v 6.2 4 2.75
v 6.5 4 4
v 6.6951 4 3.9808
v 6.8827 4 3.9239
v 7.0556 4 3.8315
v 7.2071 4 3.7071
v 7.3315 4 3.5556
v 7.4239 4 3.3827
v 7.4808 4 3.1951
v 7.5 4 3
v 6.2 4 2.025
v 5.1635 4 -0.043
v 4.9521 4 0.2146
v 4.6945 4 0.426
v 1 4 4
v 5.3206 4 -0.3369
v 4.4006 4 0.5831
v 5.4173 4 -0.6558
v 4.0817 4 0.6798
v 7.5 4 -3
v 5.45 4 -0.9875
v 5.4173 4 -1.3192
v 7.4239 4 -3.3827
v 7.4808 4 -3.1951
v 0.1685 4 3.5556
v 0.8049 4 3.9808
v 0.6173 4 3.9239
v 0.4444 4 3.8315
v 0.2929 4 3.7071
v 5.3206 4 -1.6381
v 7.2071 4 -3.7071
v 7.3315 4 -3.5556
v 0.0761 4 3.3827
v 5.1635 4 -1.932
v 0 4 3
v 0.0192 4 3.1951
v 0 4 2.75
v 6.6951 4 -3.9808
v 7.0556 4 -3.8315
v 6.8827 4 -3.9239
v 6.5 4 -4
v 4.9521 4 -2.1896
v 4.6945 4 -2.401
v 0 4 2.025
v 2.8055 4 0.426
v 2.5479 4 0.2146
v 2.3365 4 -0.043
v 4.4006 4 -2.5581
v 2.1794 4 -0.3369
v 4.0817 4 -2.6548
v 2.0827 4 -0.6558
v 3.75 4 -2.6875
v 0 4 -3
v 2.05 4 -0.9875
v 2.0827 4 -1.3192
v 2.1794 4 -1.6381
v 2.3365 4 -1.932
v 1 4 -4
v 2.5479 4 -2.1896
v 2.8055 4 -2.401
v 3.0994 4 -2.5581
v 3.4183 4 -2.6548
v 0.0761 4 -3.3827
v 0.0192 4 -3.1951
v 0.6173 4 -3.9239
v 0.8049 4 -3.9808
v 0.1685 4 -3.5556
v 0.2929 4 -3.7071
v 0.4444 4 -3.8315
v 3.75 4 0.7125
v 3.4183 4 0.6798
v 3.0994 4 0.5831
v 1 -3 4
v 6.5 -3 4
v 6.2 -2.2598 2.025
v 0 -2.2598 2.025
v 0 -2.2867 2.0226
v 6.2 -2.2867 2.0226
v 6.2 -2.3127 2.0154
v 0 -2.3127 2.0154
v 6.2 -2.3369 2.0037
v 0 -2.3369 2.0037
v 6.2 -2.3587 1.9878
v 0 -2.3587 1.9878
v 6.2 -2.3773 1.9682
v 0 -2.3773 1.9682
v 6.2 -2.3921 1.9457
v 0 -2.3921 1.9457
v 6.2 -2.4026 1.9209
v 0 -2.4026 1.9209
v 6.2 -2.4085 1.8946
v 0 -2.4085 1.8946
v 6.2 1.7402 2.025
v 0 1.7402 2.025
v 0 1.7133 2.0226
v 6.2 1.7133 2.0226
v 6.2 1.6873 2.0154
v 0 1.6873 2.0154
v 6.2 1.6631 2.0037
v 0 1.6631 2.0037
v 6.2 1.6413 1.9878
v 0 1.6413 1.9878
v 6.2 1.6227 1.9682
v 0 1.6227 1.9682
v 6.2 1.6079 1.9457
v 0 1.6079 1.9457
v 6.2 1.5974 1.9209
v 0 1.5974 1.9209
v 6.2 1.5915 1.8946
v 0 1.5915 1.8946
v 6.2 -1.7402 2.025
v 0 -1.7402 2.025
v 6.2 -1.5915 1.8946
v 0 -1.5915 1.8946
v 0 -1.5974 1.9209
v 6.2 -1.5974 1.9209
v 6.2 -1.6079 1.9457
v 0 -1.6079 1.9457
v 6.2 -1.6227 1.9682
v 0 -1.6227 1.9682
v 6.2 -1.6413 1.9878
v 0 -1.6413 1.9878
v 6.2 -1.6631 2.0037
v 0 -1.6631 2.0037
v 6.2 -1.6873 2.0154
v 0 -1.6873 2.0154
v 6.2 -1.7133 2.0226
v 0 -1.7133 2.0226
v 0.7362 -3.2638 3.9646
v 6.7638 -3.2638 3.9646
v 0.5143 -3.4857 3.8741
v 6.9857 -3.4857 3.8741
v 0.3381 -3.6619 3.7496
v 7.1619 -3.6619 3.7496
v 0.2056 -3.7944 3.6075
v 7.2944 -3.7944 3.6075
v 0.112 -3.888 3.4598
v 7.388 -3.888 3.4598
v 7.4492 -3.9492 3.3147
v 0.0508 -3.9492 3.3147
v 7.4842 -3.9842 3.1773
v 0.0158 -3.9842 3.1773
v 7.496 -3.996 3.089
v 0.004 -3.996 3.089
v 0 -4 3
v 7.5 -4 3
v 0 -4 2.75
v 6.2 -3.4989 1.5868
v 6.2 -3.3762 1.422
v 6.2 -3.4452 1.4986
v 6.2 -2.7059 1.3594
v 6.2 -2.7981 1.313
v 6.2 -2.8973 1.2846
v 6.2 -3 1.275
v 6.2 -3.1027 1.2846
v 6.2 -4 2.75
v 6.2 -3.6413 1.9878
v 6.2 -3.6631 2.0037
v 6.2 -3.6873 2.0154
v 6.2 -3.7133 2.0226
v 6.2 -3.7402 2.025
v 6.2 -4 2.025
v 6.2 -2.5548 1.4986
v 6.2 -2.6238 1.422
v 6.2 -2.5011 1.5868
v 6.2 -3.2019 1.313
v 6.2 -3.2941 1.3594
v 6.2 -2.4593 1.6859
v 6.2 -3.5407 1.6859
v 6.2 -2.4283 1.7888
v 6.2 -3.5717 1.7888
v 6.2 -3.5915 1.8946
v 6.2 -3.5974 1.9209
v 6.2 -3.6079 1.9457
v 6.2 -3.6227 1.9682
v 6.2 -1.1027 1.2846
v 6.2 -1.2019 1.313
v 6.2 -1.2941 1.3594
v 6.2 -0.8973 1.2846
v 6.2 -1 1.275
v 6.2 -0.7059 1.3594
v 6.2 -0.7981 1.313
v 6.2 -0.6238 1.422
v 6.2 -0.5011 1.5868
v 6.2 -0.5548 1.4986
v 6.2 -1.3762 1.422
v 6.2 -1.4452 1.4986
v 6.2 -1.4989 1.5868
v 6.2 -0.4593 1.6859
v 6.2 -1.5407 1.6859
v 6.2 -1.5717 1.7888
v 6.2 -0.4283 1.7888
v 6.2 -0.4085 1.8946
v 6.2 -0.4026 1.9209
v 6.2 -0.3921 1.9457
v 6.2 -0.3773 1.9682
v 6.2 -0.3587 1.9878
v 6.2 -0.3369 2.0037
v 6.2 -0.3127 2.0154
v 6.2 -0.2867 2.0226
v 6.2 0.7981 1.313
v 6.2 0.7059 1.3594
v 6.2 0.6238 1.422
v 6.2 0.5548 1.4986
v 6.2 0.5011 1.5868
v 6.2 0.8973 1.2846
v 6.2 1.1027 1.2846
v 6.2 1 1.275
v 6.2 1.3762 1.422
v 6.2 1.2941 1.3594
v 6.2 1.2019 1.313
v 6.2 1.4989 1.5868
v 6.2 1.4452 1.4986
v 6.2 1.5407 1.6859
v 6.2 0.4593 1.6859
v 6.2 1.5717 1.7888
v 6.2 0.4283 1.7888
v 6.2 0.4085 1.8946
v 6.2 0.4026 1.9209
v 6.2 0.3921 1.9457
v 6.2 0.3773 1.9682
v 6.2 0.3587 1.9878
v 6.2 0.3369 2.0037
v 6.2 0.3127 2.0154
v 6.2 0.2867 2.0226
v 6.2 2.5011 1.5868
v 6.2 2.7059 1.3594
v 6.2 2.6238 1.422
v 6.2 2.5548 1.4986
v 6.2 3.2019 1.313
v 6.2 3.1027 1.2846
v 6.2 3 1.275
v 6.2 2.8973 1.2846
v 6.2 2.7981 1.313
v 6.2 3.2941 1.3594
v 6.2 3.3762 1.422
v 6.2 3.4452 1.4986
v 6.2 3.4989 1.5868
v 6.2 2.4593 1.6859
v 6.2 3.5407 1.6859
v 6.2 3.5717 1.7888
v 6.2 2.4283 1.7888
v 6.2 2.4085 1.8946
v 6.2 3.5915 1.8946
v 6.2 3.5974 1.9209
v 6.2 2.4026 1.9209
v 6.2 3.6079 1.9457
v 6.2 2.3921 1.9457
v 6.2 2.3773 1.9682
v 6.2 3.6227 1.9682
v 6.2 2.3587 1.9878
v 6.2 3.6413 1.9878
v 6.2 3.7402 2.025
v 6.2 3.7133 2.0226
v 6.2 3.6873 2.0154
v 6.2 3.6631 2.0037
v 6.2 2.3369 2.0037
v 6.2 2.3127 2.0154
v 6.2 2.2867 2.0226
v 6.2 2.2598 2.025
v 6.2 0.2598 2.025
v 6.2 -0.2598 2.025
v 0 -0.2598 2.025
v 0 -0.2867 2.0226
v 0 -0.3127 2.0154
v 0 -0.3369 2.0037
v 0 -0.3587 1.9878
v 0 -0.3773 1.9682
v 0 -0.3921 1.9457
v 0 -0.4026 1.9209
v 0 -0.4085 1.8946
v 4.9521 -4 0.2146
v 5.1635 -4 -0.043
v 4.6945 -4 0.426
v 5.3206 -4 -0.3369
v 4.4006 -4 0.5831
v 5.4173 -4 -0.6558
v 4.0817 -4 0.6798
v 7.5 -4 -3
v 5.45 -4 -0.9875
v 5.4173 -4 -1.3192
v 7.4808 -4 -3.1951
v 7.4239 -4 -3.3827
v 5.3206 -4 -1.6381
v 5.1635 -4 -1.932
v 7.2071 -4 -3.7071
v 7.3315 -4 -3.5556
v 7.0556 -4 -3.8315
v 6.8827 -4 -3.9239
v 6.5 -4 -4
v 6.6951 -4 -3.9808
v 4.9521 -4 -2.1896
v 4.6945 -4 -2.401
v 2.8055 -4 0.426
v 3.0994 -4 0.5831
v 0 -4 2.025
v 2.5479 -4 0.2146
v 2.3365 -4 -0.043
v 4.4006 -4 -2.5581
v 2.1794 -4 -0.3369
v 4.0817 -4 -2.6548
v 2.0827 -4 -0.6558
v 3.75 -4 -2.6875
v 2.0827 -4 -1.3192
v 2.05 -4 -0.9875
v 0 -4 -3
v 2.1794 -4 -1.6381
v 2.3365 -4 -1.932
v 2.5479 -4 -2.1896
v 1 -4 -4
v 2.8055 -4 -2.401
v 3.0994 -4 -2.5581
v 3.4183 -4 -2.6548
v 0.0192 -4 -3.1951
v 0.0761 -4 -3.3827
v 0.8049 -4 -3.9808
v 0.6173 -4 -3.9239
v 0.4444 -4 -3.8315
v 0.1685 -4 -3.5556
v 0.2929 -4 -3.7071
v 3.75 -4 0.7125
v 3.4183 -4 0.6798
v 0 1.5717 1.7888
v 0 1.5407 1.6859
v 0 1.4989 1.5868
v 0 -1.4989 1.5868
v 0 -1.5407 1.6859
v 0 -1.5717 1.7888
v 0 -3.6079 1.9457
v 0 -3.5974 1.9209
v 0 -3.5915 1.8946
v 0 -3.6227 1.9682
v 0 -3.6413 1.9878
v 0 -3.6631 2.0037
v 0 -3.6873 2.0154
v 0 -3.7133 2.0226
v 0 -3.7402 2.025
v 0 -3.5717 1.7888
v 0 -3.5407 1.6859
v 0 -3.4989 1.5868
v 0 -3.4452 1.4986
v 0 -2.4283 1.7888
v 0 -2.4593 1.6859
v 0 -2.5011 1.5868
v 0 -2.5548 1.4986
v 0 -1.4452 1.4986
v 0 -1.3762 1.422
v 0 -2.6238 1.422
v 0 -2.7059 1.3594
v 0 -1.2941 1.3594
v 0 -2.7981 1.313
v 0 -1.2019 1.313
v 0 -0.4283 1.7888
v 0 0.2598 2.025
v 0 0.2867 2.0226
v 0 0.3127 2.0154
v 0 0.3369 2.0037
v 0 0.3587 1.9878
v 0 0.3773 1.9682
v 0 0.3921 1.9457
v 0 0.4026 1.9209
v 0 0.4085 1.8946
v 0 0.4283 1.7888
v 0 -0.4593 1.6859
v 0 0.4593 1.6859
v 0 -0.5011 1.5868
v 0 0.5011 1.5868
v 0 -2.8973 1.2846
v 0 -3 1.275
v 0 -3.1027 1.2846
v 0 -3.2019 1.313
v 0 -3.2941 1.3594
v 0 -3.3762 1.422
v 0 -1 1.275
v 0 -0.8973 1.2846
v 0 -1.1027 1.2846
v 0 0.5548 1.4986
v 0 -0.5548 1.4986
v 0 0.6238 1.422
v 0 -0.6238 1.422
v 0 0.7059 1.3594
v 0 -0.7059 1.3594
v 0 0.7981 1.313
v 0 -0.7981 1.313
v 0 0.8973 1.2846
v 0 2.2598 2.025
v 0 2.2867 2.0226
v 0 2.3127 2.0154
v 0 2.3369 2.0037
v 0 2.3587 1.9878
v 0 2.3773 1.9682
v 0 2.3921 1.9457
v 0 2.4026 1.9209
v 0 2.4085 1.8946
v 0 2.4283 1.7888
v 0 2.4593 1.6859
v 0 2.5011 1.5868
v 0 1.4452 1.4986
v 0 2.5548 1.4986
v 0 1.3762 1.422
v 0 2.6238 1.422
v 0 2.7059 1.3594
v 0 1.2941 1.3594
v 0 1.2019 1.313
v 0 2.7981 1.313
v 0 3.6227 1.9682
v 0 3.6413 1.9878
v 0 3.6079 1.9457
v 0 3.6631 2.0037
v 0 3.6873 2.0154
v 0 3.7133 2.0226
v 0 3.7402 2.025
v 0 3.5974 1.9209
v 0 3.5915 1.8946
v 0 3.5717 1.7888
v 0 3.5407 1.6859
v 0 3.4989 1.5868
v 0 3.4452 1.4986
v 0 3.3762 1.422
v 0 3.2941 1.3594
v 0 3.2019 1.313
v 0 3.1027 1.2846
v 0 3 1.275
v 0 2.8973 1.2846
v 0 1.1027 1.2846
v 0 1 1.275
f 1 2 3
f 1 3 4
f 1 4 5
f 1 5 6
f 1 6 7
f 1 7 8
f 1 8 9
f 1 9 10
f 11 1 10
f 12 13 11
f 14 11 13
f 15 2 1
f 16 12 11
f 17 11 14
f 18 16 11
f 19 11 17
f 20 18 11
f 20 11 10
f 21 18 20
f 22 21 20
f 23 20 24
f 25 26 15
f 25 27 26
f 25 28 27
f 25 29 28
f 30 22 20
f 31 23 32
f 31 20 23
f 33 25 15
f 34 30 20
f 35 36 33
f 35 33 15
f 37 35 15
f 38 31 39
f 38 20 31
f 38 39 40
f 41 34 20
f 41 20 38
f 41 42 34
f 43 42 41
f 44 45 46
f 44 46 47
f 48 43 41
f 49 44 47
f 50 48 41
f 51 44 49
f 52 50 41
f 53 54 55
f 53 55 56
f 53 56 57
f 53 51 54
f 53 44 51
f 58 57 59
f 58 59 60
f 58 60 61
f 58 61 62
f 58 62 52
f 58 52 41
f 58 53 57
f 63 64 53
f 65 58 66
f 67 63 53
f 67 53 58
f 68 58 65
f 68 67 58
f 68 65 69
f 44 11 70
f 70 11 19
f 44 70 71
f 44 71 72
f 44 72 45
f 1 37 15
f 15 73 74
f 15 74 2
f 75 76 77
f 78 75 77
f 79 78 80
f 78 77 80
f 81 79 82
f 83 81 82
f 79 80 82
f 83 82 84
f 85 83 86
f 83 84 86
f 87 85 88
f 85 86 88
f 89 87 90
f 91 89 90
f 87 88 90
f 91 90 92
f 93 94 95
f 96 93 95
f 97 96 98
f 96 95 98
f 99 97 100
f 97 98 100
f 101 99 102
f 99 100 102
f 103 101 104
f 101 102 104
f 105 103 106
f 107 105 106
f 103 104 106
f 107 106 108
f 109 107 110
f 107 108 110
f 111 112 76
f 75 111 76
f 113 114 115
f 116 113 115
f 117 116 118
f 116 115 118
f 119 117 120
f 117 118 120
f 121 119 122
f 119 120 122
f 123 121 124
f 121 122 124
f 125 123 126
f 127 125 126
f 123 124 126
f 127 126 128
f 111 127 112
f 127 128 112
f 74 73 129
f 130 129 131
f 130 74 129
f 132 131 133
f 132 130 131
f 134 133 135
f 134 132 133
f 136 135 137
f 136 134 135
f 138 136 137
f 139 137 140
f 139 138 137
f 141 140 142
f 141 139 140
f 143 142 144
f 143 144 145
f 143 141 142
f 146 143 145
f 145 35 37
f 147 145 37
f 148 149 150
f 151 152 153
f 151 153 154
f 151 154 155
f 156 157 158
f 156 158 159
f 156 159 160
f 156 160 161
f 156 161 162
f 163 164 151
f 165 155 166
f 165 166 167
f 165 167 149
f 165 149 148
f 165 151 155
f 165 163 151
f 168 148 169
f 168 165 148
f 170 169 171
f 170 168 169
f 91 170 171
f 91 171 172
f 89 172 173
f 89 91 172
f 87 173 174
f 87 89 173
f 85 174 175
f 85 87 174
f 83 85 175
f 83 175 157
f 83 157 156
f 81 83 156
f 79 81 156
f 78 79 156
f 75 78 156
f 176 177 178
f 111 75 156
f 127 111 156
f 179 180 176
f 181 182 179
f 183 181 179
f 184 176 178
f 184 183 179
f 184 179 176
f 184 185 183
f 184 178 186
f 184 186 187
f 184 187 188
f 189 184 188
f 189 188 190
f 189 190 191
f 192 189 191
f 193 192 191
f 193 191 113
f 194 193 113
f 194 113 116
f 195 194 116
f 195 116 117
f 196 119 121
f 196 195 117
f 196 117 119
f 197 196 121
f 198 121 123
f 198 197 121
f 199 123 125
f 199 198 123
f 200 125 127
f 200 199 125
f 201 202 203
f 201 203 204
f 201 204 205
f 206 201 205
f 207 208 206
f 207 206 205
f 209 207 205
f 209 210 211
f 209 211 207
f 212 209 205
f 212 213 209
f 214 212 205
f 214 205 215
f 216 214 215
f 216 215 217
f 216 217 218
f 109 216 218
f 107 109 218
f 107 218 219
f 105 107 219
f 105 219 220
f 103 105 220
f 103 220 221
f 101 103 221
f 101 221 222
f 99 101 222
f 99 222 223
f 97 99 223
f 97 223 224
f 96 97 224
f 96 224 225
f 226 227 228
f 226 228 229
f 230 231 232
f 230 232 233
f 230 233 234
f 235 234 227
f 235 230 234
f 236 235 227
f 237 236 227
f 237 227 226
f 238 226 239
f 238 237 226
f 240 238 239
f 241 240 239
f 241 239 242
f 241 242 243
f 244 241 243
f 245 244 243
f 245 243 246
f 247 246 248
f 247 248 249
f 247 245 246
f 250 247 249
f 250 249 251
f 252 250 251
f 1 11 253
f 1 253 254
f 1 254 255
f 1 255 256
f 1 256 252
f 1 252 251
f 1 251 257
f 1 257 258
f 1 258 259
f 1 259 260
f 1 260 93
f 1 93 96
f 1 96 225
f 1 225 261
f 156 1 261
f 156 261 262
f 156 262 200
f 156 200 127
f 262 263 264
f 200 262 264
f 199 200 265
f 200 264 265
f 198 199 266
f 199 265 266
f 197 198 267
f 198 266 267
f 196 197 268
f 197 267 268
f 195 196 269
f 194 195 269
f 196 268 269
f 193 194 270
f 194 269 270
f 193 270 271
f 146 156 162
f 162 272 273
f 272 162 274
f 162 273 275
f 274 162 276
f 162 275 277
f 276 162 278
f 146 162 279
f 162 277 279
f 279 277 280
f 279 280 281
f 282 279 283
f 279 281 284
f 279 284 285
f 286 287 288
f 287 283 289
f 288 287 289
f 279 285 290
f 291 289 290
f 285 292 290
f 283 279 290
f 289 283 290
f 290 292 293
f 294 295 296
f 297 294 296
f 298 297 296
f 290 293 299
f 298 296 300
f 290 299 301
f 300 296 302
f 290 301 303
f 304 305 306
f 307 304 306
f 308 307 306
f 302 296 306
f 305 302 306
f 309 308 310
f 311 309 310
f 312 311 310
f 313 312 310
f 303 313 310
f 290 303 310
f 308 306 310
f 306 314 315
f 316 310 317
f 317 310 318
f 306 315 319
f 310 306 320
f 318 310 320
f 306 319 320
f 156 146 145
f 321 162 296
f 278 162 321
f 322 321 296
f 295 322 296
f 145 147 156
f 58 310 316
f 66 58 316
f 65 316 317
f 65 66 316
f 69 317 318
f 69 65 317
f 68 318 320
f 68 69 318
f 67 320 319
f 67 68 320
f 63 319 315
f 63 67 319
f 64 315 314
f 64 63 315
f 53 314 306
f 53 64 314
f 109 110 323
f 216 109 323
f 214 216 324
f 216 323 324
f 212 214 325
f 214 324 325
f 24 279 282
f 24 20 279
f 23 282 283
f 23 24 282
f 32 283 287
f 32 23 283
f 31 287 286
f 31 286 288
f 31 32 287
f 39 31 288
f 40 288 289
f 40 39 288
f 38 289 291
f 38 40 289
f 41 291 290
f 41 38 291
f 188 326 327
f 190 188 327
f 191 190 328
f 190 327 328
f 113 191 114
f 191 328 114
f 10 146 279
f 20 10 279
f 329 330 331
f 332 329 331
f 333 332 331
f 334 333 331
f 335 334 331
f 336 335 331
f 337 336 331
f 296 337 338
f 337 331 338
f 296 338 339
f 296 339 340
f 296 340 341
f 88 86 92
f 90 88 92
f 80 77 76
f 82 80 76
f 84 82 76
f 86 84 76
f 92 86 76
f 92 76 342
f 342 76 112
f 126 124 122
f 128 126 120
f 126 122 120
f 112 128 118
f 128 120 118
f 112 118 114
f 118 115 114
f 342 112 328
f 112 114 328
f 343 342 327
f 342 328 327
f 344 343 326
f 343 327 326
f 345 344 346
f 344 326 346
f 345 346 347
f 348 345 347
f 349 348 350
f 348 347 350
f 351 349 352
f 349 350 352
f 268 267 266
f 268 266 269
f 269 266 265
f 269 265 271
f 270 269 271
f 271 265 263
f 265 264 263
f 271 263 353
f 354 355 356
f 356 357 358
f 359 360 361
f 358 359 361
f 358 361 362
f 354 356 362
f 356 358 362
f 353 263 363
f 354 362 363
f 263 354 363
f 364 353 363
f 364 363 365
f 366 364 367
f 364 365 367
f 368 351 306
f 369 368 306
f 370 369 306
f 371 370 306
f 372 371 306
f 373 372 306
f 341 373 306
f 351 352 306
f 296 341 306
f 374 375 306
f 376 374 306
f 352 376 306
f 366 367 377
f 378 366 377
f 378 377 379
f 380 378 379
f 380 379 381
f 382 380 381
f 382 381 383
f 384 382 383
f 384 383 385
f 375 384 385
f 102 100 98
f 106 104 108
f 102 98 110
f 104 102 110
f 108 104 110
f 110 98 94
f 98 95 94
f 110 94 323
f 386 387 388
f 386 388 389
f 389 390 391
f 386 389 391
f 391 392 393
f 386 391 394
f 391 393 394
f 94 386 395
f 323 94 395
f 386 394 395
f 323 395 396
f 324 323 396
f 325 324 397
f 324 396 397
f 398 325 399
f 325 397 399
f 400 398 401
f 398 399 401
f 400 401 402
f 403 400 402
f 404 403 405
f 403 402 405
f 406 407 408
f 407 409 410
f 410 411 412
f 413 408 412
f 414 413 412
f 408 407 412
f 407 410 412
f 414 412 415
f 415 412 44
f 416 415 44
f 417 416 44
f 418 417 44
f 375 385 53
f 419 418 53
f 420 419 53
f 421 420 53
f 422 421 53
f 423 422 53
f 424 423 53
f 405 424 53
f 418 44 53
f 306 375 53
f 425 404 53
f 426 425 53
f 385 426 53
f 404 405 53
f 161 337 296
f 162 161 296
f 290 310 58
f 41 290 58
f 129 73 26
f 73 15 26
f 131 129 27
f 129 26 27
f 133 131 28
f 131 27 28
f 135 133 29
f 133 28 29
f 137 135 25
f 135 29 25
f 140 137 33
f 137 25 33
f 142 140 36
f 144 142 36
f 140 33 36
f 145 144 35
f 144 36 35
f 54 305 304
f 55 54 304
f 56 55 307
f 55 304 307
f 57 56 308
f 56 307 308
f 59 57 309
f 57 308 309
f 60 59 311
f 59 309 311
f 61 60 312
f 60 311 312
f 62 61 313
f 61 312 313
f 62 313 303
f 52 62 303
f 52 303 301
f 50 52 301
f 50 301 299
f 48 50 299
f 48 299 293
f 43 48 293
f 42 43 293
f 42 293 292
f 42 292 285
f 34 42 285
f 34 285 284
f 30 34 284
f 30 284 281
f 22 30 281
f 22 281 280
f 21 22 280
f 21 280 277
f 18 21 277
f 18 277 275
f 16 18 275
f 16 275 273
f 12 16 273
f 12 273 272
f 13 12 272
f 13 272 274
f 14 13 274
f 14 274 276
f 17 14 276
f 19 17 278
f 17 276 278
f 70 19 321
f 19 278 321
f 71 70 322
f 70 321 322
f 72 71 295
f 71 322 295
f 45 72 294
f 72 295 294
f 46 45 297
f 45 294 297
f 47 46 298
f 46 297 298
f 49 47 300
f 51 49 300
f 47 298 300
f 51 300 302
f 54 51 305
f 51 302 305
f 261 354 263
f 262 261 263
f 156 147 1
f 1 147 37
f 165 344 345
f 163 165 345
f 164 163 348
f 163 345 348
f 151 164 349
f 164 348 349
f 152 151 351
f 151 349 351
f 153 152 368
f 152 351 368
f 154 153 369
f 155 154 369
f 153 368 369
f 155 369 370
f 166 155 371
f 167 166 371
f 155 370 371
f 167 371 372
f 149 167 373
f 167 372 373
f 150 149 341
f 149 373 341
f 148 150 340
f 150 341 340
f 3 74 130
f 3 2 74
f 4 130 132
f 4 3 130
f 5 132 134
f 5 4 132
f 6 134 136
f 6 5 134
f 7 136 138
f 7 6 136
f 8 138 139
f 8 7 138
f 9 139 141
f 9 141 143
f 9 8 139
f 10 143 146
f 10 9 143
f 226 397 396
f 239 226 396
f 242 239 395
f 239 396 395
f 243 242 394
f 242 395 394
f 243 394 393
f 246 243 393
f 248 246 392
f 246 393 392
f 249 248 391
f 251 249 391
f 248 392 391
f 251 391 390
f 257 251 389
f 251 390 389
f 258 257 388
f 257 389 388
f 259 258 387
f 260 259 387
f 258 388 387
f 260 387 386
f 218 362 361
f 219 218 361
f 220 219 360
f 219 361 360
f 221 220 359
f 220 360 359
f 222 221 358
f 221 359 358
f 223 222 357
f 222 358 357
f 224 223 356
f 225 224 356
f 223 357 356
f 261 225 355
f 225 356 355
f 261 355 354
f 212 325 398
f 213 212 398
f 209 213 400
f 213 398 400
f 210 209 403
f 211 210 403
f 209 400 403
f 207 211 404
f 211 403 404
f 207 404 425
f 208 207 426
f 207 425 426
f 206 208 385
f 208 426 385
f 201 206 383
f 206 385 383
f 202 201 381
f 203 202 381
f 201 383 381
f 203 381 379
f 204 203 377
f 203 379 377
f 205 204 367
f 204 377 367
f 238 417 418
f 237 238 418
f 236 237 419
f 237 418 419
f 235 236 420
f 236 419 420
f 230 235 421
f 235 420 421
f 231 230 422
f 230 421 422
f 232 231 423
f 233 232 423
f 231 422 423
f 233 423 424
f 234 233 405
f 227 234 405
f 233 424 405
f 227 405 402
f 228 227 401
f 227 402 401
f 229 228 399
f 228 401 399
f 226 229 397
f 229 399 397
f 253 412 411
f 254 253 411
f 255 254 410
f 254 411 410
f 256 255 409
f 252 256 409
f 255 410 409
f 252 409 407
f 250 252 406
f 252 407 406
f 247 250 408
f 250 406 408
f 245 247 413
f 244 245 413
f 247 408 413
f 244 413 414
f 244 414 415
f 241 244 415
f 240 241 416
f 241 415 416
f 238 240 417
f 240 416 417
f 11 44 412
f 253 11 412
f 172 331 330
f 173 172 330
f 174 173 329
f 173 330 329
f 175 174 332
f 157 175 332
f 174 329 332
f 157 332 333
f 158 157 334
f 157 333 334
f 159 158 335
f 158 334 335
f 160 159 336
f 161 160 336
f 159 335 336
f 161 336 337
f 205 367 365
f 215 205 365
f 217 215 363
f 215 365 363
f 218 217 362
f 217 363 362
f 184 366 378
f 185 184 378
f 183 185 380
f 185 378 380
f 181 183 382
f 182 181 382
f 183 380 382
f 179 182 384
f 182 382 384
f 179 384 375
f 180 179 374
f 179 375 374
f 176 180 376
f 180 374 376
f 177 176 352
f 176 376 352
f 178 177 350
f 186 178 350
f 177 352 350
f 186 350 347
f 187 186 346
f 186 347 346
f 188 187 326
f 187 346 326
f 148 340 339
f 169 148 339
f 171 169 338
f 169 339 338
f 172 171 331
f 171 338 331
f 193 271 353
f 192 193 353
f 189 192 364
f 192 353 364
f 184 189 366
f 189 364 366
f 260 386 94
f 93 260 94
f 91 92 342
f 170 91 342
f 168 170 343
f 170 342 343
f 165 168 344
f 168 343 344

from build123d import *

# Parameters (mm, degrees)
SKETCH1_W            = 8
SKETCH1_H            = 8
BOSS_EXTRUDE1_DEPTH  = 7.5
CUT_EXTRUDE1_DEPTH   = 6.2
M3_CLEARANCE_HOLE1_D = 3.4
FILLET1_R            = 1


with BuildPart() as part:
    # Sketch1 → Boss-Extrude1 (new body)
    with BuildSketch(Plane(origin=(0, 0, 0), x_dir=(0, 0, -1), z_dir=(1, 0, 0))):
        Rectangle(SKETCH1_W, SKETCH1_H)
    extrude(amount=BOSS_EXTRUDE1_DEPTH)

    # Sketch2 → Cut-Extrude1 (cut)
    with BuildSketch(Plane(origin=(0, 0, 0), x_dir=(0, 0, -1), z_dir=(1, 0, 0))):
        with BuildLine():
            Line((-2.025, 4), (-2.025, 3.740175425))
            ThreePointArc((-2.025, 3.740175425), (-1.987771412, 3.641268354), (-1.894565217, 3.591456891))
            ThreePointArc((-1.894565217, 3.591456891), (-1.736937846, 3.557611714), (-1.586797753, 3.498876404))
            ThreePointArc((-1.586797753, 3.498876404), (-1.275, 3), (-1.586797753, 2.501123596))
            ThreePointArc((-1.586797753, 2.501123596), (-1.736937846, 2.442388286), (-1.894565217, 2.408543109))
            ThreePointArc((-1.894565217, 2.408543109), (-1.987771412, 2.358731646), (-2.025, 2.259824575))
            Line((-2.025, 2.259824575), (-2.025, 2))
            Line((-2.025, 2), (-2.025, 1.740175425))
            ThreePointArc((-2.025, 1.740175425), (-1.987771412, 1.641268354), (-1.894565217, 1.591456891))
            ThreePointArc((-1.894565217, 1.591456891), (-1.736937846, 1.557611714), (-1.586797753, 1.498876404))
            ThreePointArc((-1.586797753, 1.498876404), (-1.275, 1), (-1.586797753, 0.501123596))
            ThreePointArc((-1.586797753, 0.501123596), (-1.736937846, 0.442388286), (-1.894565217, 0.408543109))
            ThreePointArc((-1.894565217, 0.408543109), (-1.987771412, 0.358731646), (-2.025, 0.259824575))
            Line((-2.025, 0.259824575), (-2.025, 0))
            Line((-2.025, 0), (-2.025, -0.259824575))
            ThreePointArc((-2.025, -0.259824575), (-1.987771412, -0.358731646), (-1.894565217, -0.408543109))
            ThreePointArc((-1.894565217, -0.408543109), (-1.736937846, -0.442388286), (-1.586797753, -0.501123596))
            ThreePointArc((-1.586797753, -0.501123596), (-1.275, -1), (-1.586797753, -1.498876404))
            ThreePointArc((-1.586797753, -1.498876404), (-1.736937846, -1.557611714), (-1.894565217, -1.591456891))
            ThreePointArc((-1.894565217, -1.591456891), (-1.987771412, -1.641268354), (-2.025, -1.740175425))
            Line((-2.025, -1.740175425), (-2.025, -2))
            Line((-2.025, -2), (-2.025, -2.259824575))
            ThreePointArc((-2.025, -2.259824575), (-1.987771412, -2.358731646), (-1.894565217, -2.408543109))
            ThreePointArc((-1.894565217, -2.408543109), (-1.736937846, -2.442388286), (-1.586797753, -2.501123596))
            ThreePointArc((-1.586797753, -2.501123596), (-1.275, -3), (-1.586797753, -3.498876404))
            ThreePointArc((-1.586797753, -3.498876404), (-1.736937846, -3.557611714), (-1.894565217, -3.591456891))
            ThreePointArc((-1.894565217, -3.591456891), (-1.987771412, -3.641268354), (-2.025, -3.740175425))
            Line((-2.025, -3.740175425), (-2.025, -4))
            Line((-2.025, -4), (-2.75, -4))
            Line((-2.75, -4), (-2.75, 4))
            Line((-2.75, 4), (-2.025, 4))
        make_face()
    extrude(amount=CUT_EXTRUDE1_DEPTH, mode=Mode.SUBTRACT)

    # M3 Clearance Hole1 (through all)
    with Locations(Plane(origin=(0, 4, 0), x_dir=(1, 0, 0), z_dir=(0, 1, 0))):
        with Locations((3.75, 0.9875)):
            Hole(M3_CLEARANCE_HOLE1_D / 2)

    # Fillet1
    fillet1_edges = [part.edges().sort_by_distance(p)[0] for p in [
        (7.5, 0, 4),
        (7.5, 0, -4),
        (0, 0, 4),
        (0, 0, -4),
        (3.75, -4, 4),
    ]]
    fillet(fillet1_edges, radius=FILLET1_R)


solid = part.part
